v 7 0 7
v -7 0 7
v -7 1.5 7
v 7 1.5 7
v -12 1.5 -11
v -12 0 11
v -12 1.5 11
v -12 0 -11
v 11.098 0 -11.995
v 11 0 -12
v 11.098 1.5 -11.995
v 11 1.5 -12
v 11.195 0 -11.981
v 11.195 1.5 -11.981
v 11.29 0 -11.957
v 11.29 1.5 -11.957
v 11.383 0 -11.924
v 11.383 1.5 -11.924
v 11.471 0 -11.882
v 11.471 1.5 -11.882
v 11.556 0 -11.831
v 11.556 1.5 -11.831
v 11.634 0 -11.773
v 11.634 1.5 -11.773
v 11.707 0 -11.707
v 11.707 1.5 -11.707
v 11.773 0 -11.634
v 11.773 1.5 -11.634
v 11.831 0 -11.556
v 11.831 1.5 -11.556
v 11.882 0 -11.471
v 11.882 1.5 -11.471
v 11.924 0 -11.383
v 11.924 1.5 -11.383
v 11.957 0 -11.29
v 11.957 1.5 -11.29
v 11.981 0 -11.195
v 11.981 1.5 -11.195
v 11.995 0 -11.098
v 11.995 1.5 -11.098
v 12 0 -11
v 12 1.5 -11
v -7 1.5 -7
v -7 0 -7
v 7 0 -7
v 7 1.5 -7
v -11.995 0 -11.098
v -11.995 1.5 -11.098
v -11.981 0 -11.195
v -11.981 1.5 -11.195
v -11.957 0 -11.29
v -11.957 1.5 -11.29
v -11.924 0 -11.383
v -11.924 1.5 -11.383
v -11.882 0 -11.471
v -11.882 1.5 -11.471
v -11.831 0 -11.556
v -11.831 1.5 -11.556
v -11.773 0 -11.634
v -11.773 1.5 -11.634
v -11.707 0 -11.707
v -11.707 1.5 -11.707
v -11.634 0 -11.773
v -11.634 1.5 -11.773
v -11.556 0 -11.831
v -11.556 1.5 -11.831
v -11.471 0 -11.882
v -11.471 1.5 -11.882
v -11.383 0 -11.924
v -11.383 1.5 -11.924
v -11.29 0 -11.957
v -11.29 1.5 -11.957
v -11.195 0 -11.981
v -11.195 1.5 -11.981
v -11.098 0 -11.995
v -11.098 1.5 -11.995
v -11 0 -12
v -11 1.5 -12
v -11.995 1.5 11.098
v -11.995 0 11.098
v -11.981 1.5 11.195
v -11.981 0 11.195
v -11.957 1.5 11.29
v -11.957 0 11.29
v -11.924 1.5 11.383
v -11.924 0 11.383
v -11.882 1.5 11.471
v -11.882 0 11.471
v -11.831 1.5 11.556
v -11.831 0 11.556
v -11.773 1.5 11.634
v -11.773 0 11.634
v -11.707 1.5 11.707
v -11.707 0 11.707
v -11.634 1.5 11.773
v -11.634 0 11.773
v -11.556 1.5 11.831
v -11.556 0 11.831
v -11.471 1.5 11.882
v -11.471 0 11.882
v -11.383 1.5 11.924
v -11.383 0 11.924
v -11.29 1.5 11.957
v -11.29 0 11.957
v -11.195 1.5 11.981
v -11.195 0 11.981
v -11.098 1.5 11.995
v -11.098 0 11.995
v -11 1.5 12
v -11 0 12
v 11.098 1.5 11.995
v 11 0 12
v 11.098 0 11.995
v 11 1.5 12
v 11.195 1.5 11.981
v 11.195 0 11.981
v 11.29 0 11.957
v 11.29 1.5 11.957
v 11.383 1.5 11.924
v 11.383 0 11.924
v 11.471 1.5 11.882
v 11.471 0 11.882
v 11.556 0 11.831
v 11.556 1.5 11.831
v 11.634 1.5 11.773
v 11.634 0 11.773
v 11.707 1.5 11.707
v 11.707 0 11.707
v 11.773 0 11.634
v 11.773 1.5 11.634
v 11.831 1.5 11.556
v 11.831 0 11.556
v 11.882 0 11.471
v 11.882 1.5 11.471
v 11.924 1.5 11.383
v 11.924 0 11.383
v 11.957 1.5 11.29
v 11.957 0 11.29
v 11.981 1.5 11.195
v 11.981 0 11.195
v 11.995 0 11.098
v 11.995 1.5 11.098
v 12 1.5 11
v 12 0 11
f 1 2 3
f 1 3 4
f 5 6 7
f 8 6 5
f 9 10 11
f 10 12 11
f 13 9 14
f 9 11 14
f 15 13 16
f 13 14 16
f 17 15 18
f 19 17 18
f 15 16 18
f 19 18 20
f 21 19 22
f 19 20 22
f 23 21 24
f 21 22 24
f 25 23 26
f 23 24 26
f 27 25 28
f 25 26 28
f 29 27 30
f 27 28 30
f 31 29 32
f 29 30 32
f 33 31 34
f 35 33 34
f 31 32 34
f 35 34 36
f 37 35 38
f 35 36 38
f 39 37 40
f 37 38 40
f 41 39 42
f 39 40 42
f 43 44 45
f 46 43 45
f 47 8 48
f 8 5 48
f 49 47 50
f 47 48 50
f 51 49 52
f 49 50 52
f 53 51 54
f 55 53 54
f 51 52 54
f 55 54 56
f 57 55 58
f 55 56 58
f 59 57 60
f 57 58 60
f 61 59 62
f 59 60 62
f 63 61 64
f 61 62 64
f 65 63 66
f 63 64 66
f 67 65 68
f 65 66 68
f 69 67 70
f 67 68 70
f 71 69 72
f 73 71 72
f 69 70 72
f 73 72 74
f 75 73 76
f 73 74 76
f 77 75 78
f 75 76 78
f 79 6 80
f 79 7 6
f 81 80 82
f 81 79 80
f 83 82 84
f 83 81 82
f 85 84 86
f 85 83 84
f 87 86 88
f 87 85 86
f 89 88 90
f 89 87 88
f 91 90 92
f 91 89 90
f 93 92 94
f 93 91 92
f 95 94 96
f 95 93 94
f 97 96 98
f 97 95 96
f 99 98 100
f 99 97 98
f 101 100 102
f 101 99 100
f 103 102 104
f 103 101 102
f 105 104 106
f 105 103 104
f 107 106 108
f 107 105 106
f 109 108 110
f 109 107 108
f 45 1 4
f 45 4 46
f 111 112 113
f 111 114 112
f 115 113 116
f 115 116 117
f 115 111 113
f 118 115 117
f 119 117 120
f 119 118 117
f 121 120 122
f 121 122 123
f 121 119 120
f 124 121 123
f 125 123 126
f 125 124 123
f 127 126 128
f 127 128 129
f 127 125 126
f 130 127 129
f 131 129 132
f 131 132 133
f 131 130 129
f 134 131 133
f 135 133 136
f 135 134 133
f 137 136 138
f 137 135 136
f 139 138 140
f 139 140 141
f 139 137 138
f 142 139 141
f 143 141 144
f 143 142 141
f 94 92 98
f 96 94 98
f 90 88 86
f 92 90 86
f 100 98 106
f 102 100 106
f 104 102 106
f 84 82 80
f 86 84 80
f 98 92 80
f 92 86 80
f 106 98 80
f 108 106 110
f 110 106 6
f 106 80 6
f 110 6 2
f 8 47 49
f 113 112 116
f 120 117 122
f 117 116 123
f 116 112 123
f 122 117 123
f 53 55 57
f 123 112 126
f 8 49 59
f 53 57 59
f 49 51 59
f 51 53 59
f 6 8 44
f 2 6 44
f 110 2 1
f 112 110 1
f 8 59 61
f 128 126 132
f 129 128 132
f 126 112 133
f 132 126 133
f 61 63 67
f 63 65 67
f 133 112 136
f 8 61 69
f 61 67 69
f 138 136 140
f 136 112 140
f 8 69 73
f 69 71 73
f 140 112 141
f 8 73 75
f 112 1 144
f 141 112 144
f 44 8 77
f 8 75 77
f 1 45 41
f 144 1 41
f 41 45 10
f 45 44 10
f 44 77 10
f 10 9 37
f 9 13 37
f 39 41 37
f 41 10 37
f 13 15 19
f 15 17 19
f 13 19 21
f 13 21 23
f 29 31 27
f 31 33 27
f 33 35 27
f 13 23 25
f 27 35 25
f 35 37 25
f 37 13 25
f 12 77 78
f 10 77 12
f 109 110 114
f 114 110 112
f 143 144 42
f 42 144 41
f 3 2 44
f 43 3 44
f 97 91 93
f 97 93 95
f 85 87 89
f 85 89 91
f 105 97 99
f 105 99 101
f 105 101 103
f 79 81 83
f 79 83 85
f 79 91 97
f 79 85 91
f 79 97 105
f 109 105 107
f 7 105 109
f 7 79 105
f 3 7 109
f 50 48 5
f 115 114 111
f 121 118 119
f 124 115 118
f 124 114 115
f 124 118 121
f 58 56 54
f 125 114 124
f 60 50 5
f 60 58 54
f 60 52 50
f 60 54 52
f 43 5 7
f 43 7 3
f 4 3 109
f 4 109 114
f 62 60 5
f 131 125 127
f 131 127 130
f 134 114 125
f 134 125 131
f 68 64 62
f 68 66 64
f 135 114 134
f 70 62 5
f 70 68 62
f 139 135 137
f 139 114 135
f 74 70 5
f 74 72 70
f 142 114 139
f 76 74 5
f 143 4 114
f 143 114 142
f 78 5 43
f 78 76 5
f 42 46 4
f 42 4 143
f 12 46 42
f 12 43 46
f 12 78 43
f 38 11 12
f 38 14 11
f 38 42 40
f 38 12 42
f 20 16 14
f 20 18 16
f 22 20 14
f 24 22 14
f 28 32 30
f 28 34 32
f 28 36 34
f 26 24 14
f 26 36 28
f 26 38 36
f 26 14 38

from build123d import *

# Parameters (mm, degrees)
SKETCH_1_W      = 24
SKETCH_1_H      = 24
SKETCH_1_W_2    = 14
SKETCH_1_H_2    = 14
EXTRUDE_1_DEPTH = 1.5
FILLET_1_R      = 1


with BuildPart() as part:
    # 草图1 → 凸台-拉伸1 (new body)
    with BuildSketch(Plane(origin=(0, 0, 0), x_dir=(1, 0, 0), z_dir=(0, 1, 0))):
        Rectangle(SKETCH_1_W, SKETCH_1_H)
        Rectangle(SKETCH_1_W_2, SKETCH_1_H_2, mode=Mode.SUBTRACT)
    extrude(amount=EXTRUDE_1_DEPTH)

    # 圆角1
    fillet_1_edges = [part.edges().sort_by_distance(p)[0] for p in [
        (-12, 0.75, 12),
        (-12, 0.75, -12),
        (12, 0.75, -12),
        (12, 0.75, 12),
    ]]
    fillet(fillet_1_edges, radius=FILLET_1_R)


solid = part.part
